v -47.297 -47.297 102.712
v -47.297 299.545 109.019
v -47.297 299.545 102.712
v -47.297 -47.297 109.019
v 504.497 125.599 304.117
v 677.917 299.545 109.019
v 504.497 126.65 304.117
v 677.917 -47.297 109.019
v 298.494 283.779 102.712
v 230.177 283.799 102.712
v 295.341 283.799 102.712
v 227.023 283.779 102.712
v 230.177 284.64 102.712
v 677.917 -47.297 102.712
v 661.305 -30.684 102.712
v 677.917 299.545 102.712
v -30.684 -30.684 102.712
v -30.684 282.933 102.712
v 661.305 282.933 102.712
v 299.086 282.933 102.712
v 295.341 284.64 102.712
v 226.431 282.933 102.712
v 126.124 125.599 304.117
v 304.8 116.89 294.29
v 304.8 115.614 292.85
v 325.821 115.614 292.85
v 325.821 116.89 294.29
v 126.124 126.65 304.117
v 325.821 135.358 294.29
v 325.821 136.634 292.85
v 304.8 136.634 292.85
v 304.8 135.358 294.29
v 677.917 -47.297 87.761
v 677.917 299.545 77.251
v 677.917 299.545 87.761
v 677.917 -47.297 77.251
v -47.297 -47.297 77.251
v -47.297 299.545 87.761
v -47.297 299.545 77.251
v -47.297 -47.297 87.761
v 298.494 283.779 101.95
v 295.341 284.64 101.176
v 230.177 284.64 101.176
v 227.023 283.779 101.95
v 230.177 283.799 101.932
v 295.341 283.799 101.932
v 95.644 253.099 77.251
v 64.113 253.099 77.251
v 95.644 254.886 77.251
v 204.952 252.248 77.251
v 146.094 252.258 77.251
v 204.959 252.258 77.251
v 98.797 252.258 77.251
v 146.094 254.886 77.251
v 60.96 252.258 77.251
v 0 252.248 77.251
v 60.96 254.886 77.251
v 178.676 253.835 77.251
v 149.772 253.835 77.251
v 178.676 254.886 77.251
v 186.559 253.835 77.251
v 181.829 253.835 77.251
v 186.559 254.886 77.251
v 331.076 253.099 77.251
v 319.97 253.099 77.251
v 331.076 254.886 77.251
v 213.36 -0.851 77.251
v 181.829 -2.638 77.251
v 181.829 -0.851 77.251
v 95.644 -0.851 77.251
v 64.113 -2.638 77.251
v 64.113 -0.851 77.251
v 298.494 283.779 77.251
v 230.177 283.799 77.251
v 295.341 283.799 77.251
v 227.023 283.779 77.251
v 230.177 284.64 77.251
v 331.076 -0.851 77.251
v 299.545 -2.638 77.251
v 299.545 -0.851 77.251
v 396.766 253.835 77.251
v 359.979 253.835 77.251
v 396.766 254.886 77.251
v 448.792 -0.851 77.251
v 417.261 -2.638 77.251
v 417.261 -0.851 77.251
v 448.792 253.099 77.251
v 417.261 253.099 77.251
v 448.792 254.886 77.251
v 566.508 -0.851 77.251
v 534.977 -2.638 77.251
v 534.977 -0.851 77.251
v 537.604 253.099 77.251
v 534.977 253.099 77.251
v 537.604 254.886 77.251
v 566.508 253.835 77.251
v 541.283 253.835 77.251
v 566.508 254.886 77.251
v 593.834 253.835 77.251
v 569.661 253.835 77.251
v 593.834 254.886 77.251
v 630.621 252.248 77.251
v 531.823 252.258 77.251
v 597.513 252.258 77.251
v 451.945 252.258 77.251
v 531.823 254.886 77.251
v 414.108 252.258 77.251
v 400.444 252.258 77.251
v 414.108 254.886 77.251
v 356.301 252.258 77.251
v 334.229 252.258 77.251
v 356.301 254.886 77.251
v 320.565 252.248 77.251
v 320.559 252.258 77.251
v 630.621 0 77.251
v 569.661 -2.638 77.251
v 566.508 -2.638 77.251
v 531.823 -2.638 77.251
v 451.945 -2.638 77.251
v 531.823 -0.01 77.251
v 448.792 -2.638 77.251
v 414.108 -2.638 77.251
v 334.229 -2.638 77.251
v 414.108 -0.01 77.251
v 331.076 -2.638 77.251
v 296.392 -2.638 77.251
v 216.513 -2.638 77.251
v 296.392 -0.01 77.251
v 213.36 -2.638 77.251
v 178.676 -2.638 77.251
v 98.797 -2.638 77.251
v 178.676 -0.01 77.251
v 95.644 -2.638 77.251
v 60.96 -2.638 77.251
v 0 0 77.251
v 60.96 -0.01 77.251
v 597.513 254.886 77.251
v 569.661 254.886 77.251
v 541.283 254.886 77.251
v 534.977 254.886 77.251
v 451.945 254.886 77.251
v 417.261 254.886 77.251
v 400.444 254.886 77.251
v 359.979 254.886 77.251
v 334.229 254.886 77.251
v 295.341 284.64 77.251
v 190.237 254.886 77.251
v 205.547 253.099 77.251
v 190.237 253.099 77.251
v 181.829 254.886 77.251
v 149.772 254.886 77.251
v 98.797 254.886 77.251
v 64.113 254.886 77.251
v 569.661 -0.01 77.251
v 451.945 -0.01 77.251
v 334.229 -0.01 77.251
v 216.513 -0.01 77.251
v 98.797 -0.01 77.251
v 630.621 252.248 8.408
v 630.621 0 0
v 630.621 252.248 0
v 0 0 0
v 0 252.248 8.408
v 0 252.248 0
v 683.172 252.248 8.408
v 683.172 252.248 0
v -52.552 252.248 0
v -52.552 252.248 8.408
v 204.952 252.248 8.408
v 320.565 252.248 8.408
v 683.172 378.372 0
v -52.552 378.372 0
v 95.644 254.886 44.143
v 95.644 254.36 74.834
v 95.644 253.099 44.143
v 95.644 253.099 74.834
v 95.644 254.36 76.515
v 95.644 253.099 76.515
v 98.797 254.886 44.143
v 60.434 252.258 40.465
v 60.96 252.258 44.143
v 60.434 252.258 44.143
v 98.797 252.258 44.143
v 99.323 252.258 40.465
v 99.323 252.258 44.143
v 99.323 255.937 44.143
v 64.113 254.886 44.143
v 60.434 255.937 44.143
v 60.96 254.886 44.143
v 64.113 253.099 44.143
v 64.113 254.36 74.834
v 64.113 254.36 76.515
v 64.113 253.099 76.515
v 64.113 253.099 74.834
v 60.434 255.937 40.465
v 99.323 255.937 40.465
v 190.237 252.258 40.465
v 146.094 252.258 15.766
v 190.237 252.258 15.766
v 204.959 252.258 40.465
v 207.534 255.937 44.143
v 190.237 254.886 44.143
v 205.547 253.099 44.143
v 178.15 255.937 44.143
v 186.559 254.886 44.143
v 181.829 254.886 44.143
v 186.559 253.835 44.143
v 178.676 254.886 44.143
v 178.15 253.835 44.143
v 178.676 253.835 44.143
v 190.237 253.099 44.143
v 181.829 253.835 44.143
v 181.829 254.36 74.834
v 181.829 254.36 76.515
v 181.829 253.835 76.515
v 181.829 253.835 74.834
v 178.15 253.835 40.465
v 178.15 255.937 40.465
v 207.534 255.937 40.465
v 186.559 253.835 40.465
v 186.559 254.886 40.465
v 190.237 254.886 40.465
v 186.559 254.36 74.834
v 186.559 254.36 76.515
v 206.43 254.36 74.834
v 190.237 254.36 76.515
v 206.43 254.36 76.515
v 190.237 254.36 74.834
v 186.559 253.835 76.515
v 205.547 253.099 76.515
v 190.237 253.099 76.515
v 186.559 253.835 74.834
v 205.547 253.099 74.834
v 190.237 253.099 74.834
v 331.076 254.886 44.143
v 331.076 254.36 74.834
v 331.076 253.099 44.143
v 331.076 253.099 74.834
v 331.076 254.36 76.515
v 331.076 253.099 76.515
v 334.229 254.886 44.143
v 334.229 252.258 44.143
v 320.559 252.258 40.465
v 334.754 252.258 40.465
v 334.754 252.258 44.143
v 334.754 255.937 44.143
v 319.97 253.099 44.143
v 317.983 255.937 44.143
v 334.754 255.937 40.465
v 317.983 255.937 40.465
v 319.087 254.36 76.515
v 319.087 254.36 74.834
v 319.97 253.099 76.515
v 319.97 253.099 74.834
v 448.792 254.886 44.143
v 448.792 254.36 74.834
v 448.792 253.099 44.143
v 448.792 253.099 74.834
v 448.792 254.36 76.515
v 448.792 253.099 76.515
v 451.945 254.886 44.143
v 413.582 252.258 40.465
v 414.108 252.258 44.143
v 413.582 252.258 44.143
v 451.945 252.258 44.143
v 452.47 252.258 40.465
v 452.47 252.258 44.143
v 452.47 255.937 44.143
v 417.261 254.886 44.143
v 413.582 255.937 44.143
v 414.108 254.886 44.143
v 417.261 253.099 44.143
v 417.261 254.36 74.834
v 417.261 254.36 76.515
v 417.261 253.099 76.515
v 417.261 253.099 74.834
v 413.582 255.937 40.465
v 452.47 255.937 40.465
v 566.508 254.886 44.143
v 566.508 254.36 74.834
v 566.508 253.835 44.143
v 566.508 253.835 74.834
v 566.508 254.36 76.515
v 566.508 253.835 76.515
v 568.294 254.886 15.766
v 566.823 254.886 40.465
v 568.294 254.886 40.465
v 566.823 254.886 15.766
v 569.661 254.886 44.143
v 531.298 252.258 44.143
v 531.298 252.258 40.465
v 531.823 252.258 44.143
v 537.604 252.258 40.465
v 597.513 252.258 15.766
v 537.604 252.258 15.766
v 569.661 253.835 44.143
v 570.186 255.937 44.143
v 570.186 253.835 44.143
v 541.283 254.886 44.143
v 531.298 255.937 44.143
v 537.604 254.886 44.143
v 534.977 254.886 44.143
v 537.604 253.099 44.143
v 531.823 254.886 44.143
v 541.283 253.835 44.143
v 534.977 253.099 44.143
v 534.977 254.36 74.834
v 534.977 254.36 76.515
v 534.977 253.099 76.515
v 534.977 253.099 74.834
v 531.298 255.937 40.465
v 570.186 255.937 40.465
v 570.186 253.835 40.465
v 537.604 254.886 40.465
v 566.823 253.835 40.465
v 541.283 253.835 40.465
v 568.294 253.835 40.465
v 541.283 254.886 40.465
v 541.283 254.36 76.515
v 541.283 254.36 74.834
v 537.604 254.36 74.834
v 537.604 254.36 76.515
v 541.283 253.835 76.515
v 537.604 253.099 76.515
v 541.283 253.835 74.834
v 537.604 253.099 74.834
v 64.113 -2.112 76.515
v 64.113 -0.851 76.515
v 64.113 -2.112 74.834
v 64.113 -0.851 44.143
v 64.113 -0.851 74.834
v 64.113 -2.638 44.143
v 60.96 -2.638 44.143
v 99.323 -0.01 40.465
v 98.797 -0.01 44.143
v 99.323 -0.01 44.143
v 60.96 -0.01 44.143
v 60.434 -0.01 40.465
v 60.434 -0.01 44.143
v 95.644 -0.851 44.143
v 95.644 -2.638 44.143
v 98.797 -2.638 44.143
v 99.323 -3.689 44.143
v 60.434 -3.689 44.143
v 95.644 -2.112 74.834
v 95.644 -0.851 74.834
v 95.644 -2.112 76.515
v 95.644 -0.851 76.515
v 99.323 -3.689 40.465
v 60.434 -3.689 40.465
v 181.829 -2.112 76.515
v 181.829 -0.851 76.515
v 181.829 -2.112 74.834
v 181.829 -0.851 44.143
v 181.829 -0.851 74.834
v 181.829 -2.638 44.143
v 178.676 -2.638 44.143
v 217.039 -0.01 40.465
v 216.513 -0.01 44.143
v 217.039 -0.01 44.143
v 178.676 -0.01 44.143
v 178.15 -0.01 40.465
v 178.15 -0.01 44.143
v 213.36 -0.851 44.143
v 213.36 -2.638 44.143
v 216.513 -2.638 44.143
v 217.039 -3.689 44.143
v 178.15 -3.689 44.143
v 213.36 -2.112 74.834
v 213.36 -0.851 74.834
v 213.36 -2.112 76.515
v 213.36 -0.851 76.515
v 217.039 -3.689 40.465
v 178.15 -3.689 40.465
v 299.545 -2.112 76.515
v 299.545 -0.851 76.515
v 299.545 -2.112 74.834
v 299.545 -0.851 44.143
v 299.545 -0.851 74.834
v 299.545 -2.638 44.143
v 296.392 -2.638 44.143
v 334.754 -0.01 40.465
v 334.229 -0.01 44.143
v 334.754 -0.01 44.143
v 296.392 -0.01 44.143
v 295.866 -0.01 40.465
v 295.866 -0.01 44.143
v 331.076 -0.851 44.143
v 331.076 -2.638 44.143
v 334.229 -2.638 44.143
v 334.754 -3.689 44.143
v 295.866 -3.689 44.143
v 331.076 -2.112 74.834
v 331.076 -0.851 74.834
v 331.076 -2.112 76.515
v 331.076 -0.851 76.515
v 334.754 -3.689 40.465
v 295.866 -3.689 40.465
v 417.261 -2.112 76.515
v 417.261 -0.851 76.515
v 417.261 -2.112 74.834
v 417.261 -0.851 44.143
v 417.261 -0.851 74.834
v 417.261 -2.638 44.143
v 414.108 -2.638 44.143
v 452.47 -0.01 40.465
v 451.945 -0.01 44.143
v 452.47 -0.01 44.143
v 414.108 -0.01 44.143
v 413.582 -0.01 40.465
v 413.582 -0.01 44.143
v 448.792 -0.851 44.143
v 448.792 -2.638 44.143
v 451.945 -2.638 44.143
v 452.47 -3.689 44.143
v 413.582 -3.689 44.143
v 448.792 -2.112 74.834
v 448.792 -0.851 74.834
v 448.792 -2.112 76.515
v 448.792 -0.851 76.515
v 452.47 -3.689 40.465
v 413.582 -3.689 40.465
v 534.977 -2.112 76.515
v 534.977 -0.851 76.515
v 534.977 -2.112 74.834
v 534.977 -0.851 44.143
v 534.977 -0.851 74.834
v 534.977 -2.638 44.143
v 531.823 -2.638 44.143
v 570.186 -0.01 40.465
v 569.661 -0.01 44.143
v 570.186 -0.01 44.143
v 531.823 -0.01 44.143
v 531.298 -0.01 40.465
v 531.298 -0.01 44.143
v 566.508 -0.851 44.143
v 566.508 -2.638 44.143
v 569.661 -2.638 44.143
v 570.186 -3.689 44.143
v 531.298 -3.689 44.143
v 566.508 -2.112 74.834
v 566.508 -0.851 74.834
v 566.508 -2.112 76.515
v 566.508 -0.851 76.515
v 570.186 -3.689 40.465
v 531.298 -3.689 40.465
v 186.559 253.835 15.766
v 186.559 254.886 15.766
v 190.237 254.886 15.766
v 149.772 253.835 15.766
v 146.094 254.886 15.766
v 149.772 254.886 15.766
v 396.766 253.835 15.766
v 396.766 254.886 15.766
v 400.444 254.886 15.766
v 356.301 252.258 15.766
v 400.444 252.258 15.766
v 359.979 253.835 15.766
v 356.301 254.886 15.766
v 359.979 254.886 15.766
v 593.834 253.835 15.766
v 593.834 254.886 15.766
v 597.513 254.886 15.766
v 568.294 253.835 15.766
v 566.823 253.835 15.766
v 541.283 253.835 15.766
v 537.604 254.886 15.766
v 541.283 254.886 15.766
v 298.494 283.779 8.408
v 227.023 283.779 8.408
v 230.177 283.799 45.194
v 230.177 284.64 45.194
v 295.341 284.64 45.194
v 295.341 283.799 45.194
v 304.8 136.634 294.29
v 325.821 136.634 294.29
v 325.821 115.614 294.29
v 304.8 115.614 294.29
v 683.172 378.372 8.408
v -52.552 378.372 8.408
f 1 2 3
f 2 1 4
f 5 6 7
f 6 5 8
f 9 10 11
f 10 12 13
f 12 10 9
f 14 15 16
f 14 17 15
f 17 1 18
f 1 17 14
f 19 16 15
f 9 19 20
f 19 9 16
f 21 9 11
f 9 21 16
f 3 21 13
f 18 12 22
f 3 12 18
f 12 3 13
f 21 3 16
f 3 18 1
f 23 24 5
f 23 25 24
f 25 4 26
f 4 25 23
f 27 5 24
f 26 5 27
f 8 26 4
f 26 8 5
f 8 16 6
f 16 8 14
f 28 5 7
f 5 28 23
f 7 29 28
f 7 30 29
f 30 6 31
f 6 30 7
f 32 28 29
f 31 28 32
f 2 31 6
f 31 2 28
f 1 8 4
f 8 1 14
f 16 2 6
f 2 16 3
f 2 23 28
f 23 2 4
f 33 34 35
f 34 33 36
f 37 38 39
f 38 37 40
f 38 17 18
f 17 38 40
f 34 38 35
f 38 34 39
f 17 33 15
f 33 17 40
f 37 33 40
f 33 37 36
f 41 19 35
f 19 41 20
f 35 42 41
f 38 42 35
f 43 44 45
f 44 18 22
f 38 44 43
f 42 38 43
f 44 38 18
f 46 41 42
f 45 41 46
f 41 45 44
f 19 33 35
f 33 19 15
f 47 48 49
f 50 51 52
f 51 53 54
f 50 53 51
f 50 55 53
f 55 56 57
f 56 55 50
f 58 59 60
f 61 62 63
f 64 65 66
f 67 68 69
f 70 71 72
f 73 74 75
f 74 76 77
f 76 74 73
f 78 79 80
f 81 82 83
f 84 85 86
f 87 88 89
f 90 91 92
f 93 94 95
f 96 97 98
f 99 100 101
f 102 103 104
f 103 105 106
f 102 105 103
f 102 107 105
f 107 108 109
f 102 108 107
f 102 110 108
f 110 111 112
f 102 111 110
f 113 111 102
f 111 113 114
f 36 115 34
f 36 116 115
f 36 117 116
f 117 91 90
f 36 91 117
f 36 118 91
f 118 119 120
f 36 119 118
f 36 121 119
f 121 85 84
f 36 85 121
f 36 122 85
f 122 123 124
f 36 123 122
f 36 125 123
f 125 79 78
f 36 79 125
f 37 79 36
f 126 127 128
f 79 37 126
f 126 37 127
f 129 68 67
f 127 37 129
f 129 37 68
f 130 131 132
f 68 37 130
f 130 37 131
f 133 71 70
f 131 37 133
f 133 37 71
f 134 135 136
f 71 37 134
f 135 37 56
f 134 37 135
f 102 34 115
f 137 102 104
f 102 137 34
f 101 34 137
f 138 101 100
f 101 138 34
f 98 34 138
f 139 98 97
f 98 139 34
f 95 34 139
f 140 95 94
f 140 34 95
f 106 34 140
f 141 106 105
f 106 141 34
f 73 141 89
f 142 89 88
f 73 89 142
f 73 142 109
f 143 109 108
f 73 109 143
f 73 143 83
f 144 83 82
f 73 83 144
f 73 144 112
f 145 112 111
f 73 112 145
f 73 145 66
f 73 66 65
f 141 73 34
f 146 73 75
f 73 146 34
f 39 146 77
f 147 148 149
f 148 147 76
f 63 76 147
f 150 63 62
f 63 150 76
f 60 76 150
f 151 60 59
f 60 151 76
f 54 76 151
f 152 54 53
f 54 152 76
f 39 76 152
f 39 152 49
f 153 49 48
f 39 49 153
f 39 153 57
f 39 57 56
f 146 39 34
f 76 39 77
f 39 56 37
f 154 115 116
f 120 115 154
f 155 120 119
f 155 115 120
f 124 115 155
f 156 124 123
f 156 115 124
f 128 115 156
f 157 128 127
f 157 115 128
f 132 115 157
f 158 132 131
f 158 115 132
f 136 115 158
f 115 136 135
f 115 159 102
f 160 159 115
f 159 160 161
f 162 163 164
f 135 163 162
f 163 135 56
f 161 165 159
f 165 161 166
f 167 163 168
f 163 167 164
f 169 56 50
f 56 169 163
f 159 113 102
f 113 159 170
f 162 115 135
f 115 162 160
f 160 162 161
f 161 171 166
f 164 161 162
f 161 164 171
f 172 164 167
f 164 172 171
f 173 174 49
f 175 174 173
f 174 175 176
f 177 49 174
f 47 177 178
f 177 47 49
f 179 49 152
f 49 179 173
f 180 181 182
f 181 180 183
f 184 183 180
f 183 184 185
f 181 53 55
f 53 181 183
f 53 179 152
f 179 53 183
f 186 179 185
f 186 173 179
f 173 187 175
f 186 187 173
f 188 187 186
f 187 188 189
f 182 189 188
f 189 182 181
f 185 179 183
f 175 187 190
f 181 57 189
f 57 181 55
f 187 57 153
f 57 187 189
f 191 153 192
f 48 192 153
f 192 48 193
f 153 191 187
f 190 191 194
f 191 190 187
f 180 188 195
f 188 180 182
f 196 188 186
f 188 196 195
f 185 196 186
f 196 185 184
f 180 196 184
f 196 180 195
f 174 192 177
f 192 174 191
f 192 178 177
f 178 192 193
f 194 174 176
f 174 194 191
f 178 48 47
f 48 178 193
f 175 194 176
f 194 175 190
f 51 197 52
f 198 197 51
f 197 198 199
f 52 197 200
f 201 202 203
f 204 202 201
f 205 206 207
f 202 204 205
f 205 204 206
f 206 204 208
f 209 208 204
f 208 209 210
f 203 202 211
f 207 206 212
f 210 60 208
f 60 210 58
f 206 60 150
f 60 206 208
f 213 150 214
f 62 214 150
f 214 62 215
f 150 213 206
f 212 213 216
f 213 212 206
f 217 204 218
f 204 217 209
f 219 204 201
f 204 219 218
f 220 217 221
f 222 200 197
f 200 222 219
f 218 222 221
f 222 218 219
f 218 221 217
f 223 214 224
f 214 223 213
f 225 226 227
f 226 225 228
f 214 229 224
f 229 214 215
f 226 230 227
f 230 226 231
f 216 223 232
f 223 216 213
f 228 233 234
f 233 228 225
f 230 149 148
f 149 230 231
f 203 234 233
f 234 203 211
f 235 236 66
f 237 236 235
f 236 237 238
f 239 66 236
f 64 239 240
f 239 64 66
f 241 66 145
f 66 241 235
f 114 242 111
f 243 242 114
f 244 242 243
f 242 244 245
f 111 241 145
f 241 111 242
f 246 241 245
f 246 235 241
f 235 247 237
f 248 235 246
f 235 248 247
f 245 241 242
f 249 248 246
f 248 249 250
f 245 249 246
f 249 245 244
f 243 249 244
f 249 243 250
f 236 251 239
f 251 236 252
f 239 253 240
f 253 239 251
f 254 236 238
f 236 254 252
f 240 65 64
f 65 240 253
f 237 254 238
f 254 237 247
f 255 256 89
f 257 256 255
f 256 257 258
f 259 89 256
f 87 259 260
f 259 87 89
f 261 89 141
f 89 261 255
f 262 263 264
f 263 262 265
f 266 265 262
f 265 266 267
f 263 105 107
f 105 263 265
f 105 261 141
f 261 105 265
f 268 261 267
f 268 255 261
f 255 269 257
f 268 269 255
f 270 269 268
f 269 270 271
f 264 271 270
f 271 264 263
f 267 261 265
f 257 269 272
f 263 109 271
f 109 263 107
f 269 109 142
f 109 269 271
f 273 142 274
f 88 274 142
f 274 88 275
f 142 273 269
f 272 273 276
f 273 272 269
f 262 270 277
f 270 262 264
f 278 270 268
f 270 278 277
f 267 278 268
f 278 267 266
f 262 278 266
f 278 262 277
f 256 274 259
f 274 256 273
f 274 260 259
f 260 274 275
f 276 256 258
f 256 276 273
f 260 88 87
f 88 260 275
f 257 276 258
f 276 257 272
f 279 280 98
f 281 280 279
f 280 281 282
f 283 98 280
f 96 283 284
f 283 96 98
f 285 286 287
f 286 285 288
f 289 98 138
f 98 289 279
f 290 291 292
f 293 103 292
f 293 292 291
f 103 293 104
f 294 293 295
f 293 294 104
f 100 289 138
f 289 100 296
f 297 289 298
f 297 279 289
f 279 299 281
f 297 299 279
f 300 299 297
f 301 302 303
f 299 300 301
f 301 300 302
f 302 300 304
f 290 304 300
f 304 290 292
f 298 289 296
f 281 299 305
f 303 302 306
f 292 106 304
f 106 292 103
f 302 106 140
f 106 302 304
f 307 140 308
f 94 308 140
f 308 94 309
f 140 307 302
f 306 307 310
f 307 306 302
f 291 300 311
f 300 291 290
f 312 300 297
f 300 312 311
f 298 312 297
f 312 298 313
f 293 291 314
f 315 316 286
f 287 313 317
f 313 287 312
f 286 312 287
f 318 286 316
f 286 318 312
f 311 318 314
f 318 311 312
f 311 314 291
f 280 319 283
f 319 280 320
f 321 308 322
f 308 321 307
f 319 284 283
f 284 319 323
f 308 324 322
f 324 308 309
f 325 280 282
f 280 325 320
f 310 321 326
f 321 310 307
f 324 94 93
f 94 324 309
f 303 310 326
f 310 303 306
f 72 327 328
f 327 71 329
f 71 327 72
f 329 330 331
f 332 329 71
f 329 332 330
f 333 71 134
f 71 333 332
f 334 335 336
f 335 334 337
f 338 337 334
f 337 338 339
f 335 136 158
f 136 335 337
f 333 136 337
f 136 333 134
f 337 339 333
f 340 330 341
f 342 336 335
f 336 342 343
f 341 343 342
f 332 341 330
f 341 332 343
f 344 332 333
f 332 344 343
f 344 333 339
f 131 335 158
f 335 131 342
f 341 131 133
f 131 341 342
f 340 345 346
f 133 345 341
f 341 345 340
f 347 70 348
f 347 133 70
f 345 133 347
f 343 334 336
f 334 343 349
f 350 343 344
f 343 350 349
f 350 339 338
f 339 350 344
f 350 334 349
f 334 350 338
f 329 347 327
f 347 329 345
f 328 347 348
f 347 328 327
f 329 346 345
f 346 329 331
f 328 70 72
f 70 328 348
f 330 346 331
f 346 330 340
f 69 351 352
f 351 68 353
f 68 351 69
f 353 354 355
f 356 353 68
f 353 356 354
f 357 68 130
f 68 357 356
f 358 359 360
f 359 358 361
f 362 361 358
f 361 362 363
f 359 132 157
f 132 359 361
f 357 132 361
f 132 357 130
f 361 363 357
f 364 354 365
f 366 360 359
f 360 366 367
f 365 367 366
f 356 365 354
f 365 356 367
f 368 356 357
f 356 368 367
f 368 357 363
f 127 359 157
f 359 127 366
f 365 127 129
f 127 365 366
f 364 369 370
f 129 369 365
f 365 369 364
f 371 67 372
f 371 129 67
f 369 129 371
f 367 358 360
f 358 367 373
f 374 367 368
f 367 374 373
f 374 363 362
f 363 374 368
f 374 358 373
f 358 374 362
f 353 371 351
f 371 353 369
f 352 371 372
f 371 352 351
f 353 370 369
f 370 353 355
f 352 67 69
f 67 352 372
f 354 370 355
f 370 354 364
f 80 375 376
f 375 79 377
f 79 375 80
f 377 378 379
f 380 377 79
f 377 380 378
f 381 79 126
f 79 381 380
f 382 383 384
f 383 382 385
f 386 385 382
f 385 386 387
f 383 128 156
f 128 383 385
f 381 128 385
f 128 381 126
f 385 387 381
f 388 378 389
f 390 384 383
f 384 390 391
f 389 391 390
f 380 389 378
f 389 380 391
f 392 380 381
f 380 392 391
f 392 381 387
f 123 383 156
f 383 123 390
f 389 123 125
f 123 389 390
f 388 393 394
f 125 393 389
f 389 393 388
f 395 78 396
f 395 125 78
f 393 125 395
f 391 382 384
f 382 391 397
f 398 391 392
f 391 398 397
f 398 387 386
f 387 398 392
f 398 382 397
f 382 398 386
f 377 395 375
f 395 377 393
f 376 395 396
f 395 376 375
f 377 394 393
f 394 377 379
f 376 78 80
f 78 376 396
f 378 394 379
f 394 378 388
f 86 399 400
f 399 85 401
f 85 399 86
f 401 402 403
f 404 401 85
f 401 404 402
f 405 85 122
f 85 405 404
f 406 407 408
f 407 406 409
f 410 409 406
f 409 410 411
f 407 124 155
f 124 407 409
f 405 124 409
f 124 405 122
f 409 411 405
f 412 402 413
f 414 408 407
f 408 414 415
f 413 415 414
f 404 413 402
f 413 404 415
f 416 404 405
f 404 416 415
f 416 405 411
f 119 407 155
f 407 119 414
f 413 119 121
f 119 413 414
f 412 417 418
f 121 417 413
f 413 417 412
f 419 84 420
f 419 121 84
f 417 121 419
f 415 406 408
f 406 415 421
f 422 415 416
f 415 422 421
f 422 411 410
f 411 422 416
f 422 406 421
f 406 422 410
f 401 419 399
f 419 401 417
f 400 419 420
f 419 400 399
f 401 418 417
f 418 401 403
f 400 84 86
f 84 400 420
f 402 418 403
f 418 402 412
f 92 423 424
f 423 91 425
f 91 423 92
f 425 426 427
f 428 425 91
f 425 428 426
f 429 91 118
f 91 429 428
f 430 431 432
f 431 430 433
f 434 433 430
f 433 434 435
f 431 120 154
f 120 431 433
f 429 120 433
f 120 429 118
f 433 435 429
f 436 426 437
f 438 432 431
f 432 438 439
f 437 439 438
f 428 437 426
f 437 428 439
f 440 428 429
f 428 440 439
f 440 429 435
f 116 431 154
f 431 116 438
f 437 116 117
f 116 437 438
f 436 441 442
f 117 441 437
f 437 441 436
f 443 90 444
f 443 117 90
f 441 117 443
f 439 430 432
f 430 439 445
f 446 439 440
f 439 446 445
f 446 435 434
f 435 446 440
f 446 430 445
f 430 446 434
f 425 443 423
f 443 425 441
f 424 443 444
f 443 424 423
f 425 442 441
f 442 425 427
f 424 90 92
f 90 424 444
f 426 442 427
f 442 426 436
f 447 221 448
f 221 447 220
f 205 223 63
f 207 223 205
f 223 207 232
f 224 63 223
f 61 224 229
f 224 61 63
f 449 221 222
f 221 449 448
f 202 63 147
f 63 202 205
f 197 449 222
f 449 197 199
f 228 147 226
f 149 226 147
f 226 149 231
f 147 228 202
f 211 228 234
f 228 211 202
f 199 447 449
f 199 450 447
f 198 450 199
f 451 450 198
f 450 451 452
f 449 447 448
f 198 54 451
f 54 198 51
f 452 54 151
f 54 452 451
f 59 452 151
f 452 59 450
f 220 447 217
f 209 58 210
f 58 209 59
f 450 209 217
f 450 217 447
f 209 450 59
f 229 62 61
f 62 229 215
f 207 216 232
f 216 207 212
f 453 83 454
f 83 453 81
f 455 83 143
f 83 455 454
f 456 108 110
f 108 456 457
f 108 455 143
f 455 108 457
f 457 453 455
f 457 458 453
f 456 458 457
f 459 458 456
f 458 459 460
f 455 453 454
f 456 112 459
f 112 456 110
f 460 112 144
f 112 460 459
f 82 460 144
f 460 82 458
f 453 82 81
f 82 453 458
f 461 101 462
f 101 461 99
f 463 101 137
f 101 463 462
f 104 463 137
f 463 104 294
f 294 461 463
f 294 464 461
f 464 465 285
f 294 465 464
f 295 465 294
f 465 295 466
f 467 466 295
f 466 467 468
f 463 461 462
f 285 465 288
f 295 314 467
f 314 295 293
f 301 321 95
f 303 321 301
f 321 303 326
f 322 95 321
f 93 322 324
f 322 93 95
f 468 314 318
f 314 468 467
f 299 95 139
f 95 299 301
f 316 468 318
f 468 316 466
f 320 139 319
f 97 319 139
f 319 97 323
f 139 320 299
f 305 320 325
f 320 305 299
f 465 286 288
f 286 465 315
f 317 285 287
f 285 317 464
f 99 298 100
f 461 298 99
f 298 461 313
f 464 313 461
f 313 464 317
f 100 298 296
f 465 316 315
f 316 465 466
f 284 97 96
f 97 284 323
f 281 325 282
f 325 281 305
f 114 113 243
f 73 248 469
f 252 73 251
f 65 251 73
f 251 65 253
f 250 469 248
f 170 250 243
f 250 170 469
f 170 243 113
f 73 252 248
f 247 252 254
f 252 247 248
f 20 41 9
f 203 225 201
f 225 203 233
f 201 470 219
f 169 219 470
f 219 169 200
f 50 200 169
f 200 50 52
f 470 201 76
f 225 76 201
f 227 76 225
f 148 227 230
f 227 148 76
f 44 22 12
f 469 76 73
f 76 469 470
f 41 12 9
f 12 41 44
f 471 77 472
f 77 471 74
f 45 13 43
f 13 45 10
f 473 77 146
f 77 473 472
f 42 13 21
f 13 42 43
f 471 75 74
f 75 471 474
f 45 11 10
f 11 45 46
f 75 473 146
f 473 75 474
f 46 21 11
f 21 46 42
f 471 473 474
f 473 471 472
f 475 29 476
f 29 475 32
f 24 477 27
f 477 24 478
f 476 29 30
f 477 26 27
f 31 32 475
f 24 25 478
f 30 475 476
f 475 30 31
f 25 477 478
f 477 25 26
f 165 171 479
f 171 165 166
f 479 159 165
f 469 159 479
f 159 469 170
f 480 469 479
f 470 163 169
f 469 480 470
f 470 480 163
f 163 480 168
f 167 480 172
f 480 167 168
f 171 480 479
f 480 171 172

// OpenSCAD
// =====================================================================
//  MILWAUKEE ROAD - FOND DU LAC, WIS. PASSENGER DEPOT (1898)
//  Source: Album sheet 132, Nov 1898 (J. U. Nettenstrom).  Drawings are private reference (in copyright):
//  Research Library / RSW / Stations / Standard depots / Album of Depot Plans 1919.
//  Rib Side Works, 24 Nov 2026. FIRST SHAPE MODEL for review - not cut into print sections.
//  KNOWN (from the sheet): 24 x 60 ft; women's waiting 16 ft 6 x 22, office 12 x 15 with bay, men's waiting 17 x 22, baggage 11 x 22; brick veneer, stone trim, flared hip roof with hipped dormer, cresting.
//  ESTIMATE: wall and ridge heights where not written, window count and spacing, colours.
//  Built with the shared depot builder ../../../_common/rsw_depot.scad (x along the track,
//  y = 0 town side, track side +y, feet).  SCALE: 29 = G, 48 = O, 87 = HO.
// =====================================================================
SCALE = 29;
include <../../../_common/rsw_depot.scad>

depot(blocks = [[0, 60, 0, 24, 12, 0.9, 3, 4.5, 2]],
      pavs   = [],
      wins   = [[7.6, 1, 3, 6, 4.2], [18.8, 1, 3, 6, 4.2], [30.0, 1, 3, 6, 4.2], [41.2, 1, 3, 6, 4.2], [52.4, 1, 3, 6, 4.2], [7.6, 0, 3, 6, 4.2], [18.8, 0, 3, 6, 4.2], [30.0, 0, 3, 6, 4.2], [41.2, 0, 3, 6, 4.2], [52.4, 0, 3, 6, 4.2]],
      doors  = [[16, 1, 3.5, 8, 0], [36, 1, 3.5, 8, 0], [54, 1, 5, 8, 1]],
      bays   = [[25, 1, 11, 3]],
      chims  = [[30, 12, 28]],
      plat   = [-5, 70, 12, 0.8]);
